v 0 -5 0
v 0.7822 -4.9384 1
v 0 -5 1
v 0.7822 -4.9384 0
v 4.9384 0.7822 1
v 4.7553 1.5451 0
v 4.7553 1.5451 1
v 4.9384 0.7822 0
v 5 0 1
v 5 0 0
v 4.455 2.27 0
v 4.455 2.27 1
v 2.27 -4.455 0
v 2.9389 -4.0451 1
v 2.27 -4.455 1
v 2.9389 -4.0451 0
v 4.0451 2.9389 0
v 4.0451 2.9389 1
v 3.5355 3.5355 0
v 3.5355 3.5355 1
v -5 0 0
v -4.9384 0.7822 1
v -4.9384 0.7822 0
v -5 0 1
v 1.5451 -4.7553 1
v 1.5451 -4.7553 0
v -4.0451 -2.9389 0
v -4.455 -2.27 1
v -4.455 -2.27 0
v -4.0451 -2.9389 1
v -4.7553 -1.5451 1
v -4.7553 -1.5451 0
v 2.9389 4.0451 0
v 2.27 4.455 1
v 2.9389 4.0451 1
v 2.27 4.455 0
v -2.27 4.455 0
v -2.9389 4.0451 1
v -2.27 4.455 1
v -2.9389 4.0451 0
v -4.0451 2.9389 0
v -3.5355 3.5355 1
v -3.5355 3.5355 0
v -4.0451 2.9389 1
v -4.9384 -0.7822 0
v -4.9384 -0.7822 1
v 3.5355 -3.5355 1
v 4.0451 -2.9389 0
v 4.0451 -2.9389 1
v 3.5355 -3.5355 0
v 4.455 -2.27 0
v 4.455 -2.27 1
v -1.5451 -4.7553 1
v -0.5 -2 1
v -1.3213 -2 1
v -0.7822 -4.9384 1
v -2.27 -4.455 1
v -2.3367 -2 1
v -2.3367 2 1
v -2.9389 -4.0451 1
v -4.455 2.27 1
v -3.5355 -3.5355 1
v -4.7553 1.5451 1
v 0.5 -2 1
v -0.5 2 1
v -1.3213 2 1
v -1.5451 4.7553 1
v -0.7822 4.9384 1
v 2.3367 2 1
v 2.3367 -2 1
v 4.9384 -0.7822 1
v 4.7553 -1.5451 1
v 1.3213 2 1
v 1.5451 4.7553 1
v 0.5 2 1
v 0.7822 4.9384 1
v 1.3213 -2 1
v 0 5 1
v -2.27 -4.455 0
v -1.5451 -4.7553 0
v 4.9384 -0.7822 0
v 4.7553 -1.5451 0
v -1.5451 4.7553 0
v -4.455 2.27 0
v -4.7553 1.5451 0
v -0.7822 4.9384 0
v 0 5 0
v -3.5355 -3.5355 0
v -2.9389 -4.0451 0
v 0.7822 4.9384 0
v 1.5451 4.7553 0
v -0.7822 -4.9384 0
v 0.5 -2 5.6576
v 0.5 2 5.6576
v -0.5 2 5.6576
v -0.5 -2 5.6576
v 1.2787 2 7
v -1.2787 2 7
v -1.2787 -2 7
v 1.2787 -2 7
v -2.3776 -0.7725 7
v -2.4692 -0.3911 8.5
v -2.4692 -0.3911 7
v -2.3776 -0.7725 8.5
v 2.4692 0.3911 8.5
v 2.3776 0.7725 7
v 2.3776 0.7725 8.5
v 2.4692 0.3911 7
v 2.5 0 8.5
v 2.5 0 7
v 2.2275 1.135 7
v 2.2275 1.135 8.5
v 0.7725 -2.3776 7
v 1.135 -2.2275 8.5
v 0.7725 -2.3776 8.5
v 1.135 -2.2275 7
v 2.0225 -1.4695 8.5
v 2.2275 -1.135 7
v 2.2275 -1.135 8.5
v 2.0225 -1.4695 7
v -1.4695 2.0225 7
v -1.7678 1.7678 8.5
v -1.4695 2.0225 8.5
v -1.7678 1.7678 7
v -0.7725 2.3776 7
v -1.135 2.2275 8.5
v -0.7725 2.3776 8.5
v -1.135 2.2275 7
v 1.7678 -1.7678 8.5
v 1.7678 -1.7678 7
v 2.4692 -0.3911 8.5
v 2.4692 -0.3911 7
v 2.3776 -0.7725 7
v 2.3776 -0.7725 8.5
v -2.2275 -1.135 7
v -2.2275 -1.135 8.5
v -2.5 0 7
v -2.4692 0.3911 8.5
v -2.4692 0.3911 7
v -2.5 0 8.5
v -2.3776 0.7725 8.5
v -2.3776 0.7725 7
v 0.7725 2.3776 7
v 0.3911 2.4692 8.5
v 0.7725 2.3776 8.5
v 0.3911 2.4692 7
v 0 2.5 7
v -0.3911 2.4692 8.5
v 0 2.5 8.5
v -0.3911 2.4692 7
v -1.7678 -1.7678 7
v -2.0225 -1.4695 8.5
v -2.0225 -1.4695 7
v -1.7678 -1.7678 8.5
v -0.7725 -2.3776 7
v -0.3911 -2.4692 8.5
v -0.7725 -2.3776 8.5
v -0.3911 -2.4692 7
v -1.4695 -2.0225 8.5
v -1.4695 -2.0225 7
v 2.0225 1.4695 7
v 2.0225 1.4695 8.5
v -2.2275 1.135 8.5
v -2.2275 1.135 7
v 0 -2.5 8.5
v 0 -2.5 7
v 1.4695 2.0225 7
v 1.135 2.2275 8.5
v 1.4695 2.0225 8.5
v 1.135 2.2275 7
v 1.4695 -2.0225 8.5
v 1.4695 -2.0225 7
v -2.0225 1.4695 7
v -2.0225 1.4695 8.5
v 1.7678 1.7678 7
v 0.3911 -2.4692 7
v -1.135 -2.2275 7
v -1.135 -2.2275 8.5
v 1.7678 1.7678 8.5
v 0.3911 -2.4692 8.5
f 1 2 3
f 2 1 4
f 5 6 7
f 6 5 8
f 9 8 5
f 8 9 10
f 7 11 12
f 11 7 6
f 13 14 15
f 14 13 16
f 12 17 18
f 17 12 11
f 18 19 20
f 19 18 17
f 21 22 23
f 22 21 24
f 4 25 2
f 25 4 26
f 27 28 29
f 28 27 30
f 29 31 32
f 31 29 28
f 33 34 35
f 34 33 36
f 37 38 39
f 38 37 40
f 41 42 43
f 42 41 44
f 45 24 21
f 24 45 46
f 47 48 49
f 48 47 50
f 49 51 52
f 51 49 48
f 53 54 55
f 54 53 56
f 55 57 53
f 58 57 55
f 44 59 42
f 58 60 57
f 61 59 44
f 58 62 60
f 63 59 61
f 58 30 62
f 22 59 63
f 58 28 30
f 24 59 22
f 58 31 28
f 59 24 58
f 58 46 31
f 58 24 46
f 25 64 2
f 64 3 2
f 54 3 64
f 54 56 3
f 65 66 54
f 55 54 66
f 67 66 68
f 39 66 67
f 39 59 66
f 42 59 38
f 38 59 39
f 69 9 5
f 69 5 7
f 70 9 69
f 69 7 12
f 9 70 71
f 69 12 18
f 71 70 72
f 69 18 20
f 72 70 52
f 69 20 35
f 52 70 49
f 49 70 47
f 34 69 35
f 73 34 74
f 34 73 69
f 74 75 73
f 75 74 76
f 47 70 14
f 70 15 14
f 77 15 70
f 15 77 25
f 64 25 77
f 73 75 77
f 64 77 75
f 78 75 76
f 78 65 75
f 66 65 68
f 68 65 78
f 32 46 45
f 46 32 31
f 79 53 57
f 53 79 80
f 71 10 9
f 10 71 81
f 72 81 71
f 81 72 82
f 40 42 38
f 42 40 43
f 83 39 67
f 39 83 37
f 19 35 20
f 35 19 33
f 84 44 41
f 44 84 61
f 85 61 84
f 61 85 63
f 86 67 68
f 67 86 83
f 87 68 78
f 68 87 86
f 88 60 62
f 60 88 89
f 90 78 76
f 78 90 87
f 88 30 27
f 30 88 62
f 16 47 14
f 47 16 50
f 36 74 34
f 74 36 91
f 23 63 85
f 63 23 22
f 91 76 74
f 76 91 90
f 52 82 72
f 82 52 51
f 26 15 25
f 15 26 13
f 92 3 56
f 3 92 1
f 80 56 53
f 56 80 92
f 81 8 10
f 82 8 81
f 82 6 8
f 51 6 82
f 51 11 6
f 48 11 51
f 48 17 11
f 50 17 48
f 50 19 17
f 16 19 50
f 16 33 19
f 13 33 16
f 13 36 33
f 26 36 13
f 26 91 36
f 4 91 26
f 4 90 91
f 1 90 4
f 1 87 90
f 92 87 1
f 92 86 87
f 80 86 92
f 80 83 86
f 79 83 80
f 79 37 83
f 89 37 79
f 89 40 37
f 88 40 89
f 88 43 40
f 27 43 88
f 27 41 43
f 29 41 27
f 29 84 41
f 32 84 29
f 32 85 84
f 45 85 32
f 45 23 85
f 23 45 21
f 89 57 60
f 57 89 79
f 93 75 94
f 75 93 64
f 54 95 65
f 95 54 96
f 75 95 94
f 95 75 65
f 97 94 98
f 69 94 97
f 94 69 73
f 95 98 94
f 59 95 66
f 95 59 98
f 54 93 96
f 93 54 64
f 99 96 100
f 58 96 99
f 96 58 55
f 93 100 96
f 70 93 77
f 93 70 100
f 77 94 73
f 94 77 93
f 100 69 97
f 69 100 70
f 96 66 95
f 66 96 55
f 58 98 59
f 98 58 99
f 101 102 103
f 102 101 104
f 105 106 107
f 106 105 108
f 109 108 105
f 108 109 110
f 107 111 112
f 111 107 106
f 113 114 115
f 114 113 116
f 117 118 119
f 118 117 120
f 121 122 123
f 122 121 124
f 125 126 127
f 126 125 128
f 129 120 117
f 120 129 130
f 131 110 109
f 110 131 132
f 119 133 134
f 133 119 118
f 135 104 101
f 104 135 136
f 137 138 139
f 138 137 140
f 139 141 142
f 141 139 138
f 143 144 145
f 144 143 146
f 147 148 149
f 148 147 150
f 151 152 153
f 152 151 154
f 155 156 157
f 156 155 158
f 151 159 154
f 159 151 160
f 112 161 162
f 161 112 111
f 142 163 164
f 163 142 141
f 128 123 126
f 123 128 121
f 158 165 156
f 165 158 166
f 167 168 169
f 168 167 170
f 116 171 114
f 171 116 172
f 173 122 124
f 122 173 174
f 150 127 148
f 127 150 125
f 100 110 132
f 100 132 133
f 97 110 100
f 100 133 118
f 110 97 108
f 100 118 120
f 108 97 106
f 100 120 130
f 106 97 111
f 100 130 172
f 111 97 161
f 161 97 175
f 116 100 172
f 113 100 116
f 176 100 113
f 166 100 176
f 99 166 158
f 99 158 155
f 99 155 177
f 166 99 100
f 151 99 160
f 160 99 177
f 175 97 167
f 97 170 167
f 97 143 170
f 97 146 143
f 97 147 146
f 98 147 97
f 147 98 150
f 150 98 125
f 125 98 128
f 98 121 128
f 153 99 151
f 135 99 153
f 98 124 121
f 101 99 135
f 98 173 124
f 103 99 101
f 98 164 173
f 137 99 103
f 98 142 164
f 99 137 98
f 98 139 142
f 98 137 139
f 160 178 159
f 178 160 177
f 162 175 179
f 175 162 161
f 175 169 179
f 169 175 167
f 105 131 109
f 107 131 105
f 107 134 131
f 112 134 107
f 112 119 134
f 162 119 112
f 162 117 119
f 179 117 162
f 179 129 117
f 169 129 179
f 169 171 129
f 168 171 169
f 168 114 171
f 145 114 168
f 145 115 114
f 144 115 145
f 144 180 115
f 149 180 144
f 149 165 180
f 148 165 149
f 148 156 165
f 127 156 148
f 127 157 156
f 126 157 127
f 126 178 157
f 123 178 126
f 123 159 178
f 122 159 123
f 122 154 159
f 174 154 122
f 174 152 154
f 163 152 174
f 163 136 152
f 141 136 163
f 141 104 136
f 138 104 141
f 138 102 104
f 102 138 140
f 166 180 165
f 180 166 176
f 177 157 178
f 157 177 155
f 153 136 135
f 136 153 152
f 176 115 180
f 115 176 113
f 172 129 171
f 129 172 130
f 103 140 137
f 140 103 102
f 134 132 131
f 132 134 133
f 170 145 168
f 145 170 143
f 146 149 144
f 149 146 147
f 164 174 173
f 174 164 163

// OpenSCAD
$fn=40;

cylinder(h=1, r1=5, r2=5);

translate([0,0,4])
    cube([1, 4, 7], center=true);
    
translate([1.3,0,4])
rotate([0, -10, 0])
    cube([1, 4, 7], center=true);
    
translate([-1.3,0,4])
rotate([0, 10, 0])
    cube([1, 4, 7], center=true);

translate([0,0,7])
cylinder(h=1.5, r1=2.5, r2=2.5);
